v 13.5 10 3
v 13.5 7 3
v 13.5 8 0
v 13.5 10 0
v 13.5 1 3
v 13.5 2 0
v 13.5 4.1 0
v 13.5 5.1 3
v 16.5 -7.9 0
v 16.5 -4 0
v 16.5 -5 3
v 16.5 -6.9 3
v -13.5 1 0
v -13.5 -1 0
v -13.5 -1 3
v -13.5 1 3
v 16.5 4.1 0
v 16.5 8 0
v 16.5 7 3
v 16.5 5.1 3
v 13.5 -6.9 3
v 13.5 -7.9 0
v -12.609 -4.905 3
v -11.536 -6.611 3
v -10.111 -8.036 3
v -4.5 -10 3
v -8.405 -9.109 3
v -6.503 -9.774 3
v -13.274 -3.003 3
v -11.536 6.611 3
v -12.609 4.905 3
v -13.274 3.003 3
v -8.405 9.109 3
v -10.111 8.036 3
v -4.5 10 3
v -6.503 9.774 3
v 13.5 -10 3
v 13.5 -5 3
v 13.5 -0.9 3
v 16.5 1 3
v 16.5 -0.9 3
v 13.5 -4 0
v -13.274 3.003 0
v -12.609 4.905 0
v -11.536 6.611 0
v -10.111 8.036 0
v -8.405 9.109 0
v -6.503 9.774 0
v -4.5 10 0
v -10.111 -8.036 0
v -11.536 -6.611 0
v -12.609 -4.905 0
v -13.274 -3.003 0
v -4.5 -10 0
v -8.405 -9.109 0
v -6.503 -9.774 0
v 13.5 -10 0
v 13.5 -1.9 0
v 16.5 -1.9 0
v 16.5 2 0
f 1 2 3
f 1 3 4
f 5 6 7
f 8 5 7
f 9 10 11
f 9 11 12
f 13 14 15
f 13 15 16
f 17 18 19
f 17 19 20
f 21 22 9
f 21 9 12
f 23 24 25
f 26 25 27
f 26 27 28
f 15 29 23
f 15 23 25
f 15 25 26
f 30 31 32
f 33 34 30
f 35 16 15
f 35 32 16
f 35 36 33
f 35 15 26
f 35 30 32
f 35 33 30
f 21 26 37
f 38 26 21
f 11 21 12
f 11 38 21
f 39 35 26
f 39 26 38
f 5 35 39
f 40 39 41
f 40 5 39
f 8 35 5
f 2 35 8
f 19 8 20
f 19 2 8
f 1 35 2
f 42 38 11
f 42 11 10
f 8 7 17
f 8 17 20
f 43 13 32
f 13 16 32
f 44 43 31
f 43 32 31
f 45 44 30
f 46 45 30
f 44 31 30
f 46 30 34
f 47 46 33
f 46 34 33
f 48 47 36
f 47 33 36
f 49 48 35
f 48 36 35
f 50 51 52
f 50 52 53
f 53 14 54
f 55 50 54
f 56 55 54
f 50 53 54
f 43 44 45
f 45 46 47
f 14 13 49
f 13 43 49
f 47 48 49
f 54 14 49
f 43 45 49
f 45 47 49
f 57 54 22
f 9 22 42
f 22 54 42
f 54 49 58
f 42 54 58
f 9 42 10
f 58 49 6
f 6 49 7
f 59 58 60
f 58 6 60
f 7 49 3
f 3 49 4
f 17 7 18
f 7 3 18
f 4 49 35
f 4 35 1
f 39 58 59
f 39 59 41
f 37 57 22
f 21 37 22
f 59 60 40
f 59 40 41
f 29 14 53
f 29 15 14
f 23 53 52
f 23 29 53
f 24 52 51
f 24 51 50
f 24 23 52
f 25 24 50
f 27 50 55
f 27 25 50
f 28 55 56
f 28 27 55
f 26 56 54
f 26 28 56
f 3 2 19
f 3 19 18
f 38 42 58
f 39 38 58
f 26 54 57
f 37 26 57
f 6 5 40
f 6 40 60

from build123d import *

# Parameters (mm, degrees)
SKETCH_W            = 27
SKETCH_H            = 20
PAD_DEPTH           = 3
PAD001_DEPTH        = 3
LINEARPATTERN_COUNT = 3
LINEARPATTERN_PITCH = 6
FILLET_R            = 9


with BuildPart() as part:
    # Sketch → Pad (new body)
    with BuildSketch(Plane.XY):
        Rectangle(SKETCH_W, SKETCH_H)
    extrude(amount=PAD_DEPTH)

    # Sketch001 → Pad001 (new body)
    with BuildSketch(Plane.YZ.offset(13.5)):
        Polygon((-6.9, 3), (-5, 3), (-4, 0), (-7.9, 0), align=None)
    pad001 = extrude(amount=PAD001_DEPTH)

    # LinearPattern: Pad001 ×3
    with Locations(*[(0, i * LINEARPATTERN_PITCH, 0) for i in range(1, LINEARPATTERN_COUNT)]):
        add(pad001)

    # Fillet
    fillet_edges = [part.edges().sort_by_distance(p)[0] for p in [
        (-13.5, 10, 1.5),
        (-13.5, -10, 1.5),
    ]]
    fillet(fillet_edges, radius=FILLET_R)


solid = part.part
